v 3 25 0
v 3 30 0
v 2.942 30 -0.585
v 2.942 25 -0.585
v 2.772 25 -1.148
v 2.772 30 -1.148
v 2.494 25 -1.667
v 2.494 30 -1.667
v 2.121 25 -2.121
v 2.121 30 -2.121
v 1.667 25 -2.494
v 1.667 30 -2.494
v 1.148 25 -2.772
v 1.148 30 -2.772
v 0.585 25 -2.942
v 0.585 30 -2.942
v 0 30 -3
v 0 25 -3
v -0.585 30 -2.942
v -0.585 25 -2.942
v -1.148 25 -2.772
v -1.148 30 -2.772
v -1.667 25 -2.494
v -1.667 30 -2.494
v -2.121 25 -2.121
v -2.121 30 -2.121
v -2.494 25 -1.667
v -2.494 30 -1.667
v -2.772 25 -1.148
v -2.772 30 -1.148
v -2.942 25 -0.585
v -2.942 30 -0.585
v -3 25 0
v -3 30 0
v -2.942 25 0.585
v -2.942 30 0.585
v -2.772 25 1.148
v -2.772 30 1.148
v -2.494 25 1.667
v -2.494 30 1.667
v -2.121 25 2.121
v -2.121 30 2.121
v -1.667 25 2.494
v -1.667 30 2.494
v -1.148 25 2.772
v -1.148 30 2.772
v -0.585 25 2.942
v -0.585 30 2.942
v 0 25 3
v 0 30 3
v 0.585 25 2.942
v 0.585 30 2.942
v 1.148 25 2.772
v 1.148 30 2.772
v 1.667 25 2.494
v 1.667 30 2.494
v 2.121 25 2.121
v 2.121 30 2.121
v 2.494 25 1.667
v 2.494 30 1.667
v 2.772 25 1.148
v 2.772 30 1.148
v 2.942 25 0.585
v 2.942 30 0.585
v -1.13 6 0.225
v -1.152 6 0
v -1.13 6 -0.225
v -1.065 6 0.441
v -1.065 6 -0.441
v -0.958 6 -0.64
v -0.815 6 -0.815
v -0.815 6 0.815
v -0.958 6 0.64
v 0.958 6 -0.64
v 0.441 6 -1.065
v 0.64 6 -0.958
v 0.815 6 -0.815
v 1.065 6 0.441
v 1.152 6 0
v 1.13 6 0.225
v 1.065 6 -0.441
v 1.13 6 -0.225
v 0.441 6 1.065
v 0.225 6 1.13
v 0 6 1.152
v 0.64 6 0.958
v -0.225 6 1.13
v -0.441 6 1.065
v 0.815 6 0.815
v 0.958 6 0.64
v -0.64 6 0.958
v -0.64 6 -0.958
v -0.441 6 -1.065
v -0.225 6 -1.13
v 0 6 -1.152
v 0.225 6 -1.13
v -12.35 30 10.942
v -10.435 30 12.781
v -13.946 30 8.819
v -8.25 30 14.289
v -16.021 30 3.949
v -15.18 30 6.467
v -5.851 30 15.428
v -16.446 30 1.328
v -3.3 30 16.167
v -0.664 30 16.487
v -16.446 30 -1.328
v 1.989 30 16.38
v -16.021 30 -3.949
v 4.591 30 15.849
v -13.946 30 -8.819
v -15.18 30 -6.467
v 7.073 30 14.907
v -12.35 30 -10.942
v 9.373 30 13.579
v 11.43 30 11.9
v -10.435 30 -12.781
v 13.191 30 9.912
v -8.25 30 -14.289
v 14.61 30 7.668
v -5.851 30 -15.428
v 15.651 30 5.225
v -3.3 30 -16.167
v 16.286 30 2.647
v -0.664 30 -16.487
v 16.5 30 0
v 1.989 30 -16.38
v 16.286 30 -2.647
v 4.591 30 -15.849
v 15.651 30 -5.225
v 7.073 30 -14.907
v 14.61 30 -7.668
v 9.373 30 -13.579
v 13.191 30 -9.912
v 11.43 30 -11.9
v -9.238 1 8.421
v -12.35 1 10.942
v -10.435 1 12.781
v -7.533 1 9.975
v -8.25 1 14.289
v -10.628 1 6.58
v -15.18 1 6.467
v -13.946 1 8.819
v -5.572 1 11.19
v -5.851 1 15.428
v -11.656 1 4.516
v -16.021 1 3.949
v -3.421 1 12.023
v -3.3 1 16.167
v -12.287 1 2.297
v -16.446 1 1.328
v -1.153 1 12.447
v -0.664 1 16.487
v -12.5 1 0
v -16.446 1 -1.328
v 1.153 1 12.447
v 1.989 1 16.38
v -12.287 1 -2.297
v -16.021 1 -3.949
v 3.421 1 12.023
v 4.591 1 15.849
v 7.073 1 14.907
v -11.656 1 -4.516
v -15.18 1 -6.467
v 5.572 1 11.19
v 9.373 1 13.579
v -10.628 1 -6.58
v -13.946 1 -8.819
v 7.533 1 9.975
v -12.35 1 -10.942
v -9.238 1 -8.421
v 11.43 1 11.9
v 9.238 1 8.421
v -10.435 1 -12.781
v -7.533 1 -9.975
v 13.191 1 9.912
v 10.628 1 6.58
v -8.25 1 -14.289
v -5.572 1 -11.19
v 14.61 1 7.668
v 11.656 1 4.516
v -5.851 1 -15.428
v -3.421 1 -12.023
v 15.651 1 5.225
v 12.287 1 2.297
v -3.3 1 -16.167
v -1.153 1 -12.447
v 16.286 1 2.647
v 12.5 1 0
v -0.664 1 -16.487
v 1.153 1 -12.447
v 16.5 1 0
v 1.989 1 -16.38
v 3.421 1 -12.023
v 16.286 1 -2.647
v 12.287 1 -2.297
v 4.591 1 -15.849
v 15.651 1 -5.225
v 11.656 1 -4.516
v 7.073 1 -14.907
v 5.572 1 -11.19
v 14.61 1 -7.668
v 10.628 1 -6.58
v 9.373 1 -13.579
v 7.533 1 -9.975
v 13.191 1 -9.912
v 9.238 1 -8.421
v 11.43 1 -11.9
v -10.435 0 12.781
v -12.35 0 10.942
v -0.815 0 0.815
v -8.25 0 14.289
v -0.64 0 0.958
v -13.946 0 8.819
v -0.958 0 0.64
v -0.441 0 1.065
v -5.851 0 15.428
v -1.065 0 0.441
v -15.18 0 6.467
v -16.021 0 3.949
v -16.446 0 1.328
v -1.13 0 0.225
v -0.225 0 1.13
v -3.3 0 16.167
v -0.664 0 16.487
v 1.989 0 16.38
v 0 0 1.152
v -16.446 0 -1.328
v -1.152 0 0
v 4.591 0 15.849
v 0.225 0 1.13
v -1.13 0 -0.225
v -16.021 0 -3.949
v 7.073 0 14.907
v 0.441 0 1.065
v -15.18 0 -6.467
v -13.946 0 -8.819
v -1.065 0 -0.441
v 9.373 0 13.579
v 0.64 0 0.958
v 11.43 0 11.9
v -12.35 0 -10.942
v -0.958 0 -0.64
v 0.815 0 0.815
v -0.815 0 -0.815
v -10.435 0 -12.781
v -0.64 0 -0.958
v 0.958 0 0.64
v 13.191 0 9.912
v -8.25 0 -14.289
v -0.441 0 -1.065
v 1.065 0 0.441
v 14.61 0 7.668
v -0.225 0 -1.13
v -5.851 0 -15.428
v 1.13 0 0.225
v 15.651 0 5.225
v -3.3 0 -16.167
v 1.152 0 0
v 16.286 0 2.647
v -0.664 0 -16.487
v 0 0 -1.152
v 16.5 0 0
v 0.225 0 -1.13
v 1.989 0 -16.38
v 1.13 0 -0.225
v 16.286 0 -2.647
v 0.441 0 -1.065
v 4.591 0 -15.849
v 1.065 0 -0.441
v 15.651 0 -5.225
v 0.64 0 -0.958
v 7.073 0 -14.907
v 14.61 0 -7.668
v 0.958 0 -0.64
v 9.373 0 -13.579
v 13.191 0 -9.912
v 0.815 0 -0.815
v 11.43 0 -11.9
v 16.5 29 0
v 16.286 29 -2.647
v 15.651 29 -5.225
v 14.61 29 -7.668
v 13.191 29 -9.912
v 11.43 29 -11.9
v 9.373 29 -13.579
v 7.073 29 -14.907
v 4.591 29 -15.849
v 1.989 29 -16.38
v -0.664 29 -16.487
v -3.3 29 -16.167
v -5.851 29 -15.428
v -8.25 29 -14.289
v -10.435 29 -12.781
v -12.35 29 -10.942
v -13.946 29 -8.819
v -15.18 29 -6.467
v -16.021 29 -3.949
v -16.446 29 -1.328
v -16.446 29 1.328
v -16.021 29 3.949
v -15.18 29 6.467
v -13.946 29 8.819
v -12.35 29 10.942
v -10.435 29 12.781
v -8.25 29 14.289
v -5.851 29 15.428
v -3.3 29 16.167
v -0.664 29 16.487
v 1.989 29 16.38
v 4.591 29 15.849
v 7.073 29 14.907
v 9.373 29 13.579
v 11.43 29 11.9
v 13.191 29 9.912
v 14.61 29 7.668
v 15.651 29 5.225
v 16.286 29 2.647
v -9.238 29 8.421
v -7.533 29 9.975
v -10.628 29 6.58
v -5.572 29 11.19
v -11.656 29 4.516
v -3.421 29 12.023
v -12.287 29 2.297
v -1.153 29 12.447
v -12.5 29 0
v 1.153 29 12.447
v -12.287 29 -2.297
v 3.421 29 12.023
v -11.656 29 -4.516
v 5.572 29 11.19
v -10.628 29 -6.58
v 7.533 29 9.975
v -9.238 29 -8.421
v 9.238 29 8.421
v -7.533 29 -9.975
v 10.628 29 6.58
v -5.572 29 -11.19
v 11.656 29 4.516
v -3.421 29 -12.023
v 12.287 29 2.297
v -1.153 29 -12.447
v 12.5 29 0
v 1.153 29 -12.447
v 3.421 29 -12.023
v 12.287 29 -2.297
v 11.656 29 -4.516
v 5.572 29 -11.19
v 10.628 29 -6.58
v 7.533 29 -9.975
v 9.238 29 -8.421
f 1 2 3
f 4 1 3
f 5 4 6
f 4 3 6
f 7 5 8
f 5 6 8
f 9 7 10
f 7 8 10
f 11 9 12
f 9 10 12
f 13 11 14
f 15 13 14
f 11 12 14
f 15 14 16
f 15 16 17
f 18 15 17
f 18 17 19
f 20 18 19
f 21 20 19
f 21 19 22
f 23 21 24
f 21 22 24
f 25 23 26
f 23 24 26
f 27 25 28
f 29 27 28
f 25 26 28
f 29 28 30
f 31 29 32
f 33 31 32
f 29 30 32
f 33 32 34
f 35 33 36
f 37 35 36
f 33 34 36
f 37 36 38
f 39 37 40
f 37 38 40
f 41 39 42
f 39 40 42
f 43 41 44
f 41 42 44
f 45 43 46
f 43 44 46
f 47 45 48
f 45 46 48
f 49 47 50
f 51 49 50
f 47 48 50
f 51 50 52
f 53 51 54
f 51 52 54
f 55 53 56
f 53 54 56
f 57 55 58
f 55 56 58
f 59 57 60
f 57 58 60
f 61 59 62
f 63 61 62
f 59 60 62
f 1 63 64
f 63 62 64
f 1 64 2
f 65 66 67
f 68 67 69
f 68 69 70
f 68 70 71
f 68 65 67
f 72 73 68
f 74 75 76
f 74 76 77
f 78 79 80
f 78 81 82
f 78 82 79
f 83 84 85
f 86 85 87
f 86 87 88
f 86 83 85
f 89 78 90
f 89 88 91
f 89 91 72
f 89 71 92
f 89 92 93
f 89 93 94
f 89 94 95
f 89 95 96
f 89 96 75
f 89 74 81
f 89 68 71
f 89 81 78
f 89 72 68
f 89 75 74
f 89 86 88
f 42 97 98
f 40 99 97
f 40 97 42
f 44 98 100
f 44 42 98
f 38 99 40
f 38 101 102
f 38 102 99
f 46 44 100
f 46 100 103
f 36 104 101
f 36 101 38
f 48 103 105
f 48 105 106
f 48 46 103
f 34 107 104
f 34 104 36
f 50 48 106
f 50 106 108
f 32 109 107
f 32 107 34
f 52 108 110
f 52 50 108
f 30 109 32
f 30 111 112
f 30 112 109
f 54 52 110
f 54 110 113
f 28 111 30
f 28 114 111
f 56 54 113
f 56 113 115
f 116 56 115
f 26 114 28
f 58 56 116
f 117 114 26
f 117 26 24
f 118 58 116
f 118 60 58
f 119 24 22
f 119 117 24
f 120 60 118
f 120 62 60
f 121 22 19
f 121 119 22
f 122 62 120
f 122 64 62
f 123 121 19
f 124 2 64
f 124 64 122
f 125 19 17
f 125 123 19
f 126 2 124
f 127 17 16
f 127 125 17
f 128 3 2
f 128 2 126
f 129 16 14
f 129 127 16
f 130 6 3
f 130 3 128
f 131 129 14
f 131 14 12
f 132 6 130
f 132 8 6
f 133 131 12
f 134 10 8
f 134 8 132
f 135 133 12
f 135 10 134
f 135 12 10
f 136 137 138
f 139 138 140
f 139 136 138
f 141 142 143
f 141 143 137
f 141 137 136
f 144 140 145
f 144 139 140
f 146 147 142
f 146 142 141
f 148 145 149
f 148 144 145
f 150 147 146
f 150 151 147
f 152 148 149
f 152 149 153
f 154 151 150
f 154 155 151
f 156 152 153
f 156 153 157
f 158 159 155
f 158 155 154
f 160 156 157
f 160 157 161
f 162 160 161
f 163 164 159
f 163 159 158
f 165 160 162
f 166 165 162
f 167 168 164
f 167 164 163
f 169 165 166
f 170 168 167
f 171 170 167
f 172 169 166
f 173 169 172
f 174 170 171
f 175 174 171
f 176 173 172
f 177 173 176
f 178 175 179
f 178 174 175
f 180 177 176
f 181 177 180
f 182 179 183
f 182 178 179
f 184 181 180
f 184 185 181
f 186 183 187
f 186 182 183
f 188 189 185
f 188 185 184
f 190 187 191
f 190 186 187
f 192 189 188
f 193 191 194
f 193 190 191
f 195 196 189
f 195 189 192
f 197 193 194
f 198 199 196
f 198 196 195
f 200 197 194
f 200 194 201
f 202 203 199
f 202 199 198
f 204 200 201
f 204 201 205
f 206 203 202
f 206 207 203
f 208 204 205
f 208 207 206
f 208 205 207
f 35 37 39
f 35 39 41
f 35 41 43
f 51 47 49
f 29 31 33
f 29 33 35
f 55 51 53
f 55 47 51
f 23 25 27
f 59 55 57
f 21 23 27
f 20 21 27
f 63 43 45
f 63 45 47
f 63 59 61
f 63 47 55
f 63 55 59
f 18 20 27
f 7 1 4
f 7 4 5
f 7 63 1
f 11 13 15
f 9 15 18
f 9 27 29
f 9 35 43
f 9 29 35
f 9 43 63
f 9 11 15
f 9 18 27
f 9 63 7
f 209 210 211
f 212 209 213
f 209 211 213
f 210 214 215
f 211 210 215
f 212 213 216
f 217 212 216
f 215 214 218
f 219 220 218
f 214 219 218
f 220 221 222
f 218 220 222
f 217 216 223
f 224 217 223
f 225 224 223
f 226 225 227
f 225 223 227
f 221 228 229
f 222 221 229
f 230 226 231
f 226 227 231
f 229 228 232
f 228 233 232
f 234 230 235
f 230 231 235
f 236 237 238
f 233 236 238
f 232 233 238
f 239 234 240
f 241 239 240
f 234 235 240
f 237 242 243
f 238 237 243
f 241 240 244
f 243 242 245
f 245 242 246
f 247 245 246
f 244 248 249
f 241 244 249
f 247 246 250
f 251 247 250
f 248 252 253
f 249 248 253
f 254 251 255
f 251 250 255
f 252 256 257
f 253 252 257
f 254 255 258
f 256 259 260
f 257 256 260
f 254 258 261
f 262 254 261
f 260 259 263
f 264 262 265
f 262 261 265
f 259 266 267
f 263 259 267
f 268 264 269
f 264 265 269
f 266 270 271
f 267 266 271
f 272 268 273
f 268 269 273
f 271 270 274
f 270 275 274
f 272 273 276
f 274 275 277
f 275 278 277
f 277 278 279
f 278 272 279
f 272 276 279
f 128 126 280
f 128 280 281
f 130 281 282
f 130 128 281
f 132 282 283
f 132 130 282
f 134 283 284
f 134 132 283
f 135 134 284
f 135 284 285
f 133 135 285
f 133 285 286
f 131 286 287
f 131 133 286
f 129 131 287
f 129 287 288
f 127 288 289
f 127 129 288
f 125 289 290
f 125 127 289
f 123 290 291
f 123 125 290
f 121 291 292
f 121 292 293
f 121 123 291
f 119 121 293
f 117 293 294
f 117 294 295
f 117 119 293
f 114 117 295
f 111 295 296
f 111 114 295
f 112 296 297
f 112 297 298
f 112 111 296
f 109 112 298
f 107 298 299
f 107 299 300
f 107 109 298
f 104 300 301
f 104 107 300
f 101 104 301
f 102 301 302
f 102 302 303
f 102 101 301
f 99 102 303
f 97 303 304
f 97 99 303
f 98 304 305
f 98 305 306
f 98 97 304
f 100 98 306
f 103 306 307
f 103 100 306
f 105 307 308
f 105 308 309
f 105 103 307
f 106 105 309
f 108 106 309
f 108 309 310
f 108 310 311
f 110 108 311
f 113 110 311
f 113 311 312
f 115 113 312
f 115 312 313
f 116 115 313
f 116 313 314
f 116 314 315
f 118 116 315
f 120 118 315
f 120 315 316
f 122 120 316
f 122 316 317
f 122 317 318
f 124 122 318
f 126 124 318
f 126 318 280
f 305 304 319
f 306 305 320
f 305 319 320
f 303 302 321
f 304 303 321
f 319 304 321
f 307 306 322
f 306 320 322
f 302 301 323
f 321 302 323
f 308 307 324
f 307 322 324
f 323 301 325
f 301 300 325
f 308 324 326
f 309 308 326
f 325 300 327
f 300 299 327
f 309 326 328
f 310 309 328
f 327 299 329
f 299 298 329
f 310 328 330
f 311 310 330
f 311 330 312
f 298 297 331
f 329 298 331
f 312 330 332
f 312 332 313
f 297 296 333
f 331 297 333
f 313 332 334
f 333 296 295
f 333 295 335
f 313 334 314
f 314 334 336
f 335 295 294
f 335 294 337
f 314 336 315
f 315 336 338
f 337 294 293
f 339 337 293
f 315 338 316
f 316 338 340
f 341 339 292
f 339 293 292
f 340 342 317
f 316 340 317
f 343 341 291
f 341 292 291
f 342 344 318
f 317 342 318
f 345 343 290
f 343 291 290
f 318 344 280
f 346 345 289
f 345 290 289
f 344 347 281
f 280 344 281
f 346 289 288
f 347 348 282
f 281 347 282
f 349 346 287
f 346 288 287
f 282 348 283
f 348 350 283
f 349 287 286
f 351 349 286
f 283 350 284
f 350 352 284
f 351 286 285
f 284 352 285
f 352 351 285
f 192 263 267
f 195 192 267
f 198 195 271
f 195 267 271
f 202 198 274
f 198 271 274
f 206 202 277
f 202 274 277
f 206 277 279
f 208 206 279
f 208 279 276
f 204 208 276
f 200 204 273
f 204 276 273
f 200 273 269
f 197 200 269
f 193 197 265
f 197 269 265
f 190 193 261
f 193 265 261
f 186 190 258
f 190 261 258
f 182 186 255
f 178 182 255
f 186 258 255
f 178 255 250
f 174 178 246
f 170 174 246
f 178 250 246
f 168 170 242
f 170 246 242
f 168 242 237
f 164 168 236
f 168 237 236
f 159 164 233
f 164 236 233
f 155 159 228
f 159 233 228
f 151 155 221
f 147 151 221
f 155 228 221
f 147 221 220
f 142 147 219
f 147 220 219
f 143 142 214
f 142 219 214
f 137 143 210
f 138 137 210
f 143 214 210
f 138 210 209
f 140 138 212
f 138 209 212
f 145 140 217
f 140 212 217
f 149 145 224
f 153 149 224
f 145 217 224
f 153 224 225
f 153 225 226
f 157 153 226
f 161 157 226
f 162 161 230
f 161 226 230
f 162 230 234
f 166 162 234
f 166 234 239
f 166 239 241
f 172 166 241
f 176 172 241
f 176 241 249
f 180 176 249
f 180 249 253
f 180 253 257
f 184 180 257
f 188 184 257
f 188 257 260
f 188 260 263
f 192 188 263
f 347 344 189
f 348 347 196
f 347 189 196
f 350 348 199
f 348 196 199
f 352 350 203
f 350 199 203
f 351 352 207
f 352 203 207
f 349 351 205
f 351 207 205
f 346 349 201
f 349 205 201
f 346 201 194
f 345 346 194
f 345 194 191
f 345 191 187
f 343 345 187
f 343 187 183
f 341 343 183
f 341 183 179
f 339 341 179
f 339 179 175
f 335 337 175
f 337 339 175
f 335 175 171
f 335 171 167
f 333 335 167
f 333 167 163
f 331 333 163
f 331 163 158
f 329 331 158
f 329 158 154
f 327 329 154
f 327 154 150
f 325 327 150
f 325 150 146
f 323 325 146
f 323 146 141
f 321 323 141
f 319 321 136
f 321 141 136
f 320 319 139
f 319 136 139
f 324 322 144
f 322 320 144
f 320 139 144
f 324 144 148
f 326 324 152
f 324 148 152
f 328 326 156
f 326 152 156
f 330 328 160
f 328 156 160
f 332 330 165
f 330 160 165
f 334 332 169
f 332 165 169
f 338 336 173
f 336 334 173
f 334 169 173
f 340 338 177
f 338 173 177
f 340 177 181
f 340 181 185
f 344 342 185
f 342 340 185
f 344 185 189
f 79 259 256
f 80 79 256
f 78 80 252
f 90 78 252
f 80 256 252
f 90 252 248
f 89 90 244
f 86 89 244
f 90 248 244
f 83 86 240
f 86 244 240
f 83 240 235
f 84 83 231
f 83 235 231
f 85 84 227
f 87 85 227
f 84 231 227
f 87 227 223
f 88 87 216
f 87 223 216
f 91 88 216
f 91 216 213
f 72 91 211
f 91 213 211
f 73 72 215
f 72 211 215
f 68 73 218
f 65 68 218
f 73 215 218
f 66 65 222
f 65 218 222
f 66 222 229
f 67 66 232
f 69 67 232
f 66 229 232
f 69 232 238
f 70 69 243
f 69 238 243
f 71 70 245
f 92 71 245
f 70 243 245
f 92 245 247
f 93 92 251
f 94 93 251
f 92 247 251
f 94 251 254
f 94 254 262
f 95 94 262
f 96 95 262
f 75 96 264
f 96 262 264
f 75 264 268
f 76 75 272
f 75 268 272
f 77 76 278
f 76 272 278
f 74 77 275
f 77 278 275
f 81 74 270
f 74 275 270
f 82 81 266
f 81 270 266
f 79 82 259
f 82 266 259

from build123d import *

# Parameters (mm, degrees)
ESQUISSE1_R             = 12.5
BOSS_EXTRU_1_DEPTH      = 30
ESQUISSE1_3_R           = 16.5
ESQUISSE1_3_R_2         = 12.5
BOSS_EXTRU_2_DEPTH      = 1
BOSS_EXTRU_3_START      = -1
ESQUISSE2_R             = 16.5
BOSS_EXTRU_3_DEPTH      = 1
ESQUISSE3_R             = 1.1525
ENL_V_MAT_EXTRU_1_DEPTH = 6
ESQUISSE4_R             = 3
ENL_V_MAT_EXTRU_2_DEPTH = 5


with BuildPart() as part:
    # Esquisse1 → Boss.-Extru.1 (new body)
    with BuildSketch(Plane(origin=(0, 0, 0), x_dir=(1, 0, 0), z_dir=(0, 1, 0))):
        Circle(ESQUISSE1_R)
    extrude(amount=BOSS_EXTRU_1_DEPTH)

    # Esquisse1<3> → Boss.-Extru.2 (add)
    with BuildSketch(Plane(origin=(0, 0, 0), x_dir=(1, 0, 0), z_dir=(0, 1, 0))):
        Circle(ESQUISSE1_3_R)
        Circle(ESQUISSE1_3_R_2, mode=Mode.SUBTRACT)
    extrude(amount=BOSS_EXTRU_2_DEPTH)

    # Esquisse2 → Boss.-Extru.3 (add)
    with BuildSketch(Plane(origin=(0, 30, 0), x_dir=(1, 0, 0), z_dir=(0, 1, 0)).offset(BOSS_EXTRU_3_START)):
        Circle(ESQUISSE2_R)
    extrude(amount=BOSS_EXTRU_3_DEPTH)

    # Esquisse3 → Enlèv. mat.-Extru.1 (cut)
    with BuildSketch(Plane.XZ):
        Circle(ESQUISSE3_R)
    extrude(amount=-ENL_V_MAT_EXTRU_1_DEPTH, mode=Mode.SUBTRACT)

    # Esquisse4 → Enlèv. mat.-Extru.2 (cut)
    with BuildSketch(Plane(origin=(0, 30, 0), x_dir=(1, 0, 0), z_dir=(0, 1, 0))):
        Circle(ESQUISSE4_R)
    extrude(amount=-ENL_V_MAT_EXTRU_2_DEPTH, mode=Mode.SUBTRACT)


solid = part.part
